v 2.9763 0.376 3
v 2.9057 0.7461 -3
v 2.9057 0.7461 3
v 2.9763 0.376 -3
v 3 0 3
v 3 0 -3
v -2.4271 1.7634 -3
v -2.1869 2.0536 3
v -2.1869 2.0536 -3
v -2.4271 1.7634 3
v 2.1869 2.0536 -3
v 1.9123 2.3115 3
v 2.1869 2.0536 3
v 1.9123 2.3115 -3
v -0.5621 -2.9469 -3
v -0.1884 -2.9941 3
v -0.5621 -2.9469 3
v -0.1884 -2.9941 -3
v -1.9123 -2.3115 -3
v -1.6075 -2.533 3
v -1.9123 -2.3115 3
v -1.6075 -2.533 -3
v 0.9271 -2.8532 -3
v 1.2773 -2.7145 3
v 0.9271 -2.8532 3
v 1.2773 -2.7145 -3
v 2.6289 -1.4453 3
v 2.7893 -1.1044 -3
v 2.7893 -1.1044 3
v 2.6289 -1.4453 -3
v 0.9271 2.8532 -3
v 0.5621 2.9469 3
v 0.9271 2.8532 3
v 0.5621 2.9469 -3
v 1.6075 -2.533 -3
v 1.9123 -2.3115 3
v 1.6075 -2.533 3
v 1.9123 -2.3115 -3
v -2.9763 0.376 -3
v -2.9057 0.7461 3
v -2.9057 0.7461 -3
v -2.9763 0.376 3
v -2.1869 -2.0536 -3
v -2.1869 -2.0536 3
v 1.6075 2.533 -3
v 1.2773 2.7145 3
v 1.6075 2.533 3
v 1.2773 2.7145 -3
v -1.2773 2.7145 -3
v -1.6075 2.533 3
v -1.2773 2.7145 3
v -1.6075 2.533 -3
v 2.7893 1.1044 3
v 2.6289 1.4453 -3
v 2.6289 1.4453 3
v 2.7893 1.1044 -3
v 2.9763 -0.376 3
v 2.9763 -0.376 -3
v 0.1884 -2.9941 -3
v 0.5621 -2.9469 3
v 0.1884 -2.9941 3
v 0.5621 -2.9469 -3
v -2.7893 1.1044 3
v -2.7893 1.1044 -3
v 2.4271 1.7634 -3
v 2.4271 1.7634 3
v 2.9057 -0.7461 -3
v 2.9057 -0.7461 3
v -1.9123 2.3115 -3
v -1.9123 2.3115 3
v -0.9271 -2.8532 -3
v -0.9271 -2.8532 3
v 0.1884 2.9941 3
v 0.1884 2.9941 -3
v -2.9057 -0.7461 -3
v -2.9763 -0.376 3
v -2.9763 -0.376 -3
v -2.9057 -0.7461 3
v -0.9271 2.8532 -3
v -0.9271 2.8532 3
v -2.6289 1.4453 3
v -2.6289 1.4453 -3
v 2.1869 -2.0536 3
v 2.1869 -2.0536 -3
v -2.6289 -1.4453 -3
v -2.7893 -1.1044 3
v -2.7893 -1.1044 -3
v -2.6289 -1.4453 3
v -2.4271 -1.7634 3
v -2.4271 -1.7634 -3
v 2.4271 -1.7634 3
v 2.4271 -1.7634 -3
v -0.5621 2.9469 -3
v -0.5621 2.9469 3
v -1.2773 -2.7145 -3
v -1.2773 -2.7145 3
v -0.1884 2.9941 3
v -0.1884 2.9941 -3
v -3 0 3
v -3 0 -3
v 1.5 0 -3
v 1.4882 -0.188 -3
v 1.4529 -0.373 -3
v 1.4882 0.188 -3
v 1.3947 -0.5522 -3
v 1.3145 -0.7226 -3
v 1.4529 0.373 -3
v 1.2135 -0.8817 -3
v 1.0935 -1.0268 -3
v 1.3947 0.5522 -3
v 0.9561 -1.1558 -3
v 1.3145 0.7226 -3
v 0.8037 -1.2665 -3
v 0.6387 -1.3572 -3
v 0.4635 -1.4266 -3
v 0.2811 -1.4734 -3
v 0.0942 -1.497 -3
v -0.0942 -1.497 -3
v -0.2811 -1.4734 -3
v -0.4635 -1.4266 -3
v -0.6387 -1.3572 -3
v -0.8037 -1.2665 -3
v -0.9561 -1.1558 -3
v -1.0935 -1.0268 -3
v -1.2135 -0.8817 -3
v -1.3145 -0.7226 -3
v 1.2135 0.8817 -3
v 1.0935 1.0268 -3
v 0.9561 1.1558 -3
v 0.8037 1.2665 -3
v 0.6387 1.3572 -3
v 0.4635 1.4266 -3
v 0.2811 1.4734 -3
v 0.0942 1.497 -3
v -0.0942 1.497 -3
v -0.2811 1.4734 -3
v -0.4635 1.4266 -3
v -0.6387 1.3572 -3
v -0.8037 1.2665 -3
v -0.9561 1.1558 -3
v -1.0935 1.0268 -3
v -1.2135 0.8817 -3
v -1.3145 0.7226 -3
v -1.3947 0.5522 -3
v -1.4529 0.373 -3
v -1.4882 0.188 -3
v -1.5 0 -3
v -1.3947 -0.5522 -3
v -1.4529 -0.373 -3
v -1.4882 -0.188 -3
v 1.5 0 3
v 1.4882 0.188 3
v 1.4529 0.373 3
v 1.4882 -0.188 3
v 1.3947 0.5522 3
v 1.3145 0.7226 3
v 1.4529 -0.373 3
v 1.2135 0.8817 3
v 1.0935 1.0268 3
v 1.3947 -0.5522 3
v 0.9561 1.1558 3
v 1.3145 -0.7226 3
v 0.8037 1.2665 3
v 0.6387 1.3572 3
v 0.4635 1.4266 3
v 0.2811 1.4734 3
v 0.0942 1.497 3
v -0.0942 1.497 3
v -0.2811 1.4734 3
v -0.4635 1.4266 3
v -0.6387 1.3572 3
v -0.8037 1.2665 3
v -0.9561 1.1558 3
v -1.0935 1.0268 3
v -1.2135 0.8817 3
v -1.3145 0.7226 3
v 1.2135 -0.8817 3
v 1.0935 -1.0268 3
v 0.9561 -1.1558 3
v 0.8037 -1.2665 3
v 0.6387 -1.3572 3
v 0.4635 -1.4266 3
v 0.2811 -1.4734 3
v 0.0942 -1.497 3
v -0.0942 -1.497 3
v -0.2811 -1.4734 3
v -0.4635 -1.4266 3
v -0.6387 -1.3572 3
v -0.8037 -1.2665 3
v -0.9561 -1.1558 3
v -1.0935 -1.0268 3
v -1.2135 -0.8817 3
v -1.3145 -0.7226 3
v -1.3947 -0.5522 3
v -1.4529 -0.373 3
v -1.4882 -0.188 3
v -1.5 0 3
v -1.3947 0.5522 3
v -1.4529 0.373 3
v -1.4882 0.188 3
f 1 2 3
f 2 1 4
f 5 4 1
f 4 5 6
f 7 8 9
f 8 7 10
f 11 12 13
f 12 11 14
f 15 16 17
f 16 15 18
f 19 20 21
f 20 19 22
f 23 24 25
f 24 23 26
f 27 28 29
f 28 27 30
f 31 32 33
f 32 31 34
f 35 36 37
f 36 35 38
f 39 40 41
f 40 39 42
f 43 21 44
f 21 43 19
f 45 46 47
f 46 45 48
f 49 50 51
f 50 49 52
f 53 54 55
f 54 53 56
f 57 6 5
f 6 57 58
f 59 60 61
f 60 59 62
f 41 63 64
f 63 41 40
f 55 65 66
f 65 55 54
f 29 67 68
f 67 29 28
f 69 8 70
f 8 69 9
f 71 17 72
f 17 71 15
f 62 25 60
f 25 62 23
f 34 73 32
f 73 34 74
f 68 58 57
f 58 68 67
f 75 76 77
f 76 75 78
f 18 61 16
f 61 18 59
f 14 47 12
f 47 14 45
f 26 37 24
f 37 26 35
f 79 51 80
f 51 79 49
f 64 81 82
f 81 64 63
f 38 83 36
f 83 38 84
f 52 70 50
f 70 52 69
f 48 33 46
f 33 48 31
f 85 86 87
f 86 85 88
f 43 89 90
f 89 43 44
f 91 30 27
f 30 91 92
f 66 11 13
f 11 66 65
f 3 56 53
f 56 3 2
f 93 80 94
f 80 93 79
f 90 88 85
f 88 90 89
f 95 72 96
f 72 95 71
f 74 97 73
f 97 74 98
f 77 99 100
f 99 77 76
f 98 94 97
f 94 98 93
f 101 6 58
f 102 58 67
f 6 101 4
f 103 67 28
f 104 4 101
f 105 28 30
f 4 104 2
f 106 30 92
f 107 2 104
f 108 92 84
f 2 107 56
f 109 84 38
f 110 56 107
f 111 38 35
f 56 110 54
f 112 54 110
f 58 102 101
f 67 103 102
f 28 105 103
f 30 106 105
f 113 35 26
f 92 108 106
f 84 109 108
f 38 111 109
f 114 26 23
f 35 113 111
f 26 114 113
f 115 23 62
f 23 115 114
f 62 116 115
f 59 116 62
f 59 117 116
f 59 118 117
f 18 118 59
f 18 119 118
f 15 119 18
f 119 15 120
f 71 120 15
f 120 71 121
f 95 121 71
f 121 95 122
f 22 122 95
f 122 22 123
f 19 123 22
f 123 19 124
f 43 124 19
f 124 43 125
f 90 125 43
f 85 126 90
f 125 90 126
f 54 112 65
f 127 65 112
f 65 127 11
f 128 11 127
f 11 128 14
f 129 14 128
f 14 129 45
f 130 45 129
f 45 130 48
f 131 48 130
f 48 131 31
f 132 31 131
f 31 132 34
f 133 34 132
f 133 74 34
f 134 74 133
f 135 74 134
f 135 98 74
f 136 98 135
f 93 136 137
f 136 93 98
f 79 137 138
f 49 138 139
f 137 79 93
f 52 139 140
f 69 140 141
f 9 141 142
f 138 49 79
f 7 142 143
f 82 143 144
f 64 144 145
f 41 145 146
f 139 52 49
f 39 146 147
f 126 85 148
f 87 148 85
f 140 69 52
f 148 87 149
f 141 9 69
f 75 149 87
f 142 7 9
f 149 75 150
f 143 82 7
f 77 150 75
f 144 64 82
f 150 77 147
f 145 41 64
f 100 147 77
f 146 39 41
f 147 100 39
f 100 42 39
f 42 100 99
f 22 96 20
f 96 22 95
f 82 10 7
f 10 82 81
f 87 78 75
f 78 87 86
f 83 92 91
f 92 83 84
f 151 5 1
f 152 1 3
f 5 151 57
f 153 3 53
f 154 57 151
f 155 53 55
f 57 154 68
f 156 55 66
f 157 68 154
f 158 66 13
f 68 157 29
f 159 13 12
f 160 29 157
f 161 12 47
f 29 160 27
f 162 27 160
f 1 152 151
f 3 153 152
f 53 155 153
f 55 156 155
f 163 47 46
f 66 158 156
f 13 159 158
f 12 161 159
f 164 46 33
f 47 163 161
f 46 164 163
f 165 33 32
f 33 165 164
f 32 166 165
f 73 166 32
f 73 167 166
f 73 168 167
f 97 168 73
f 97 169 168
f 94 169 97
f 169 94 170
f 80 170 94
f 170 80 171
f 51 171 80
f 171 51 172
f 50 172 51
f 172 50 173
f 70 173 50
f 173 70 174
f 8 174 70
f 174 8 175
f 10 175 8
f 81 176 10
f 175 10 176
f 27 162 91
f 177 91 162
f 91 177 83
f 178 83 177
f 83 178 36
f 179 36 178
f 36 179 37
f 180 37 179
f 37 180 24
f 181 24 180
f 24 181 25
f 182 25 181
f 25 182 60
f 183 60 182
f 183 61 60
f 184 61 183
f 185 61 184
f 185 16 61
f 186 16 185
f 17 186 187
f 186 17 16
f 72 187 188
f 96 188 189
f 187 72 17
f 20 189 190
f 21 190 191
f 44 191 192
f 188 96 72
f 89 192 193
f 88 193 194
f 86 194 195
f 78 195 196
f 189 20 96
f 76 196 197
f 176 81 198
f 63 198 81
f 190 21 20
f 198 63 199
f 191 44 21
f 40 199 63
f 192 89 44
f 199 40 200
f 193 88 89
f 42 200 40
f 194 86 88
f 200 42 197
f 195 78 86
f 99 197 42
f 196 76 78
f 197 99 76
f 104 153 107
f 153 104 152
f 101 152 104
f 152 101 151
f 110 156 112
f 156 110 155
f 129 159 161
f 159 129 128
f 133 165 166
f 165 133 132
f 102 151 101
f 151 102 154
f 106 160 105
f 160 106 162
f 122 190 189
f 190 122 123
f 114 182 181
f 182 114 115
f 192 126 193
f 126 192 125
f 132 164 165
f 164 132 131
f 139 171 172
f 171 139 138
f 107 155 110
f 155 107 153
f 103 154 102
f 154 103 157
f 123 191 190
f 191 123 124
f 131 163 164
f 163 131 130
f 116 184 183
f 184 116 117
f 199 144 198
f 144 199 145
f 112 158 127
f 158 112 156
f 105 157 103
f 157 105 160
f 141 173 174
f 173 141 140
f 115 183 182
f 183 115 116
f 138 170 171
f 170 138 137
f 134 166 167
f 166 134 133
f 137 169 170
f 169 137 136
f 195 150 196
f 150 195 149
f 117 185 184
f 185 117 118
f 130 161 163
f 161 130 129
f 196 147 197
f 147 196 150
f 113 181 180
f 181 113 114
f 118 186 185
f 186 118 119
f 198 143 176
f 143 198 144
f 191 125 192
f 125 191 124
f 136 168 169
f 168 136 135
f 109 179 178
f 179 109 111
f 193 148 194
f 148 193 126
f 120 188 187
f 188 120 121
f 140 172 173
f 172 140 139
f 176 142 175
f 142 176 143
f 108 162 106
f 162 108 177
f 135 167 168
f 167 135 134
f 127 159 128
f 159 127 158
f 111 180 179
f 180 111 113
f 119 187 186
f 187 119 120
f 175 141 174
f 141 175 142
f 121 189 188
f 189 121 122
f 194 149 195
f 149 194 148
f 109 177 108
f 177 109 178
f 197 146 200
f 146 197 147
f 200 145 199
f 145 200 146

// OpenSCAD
$fn = 50;


difference() {
	union() {
		translate(v = [0, 0, -3.0000000000]) {
			cylinder(h = 6, r = 3.0000000000);
		}
	}
	union() {
		translate(v = [0, 0, -100.0000000000]) {
			cylinder(h = 200, r = 1.5000000000);
		}
	}
}
